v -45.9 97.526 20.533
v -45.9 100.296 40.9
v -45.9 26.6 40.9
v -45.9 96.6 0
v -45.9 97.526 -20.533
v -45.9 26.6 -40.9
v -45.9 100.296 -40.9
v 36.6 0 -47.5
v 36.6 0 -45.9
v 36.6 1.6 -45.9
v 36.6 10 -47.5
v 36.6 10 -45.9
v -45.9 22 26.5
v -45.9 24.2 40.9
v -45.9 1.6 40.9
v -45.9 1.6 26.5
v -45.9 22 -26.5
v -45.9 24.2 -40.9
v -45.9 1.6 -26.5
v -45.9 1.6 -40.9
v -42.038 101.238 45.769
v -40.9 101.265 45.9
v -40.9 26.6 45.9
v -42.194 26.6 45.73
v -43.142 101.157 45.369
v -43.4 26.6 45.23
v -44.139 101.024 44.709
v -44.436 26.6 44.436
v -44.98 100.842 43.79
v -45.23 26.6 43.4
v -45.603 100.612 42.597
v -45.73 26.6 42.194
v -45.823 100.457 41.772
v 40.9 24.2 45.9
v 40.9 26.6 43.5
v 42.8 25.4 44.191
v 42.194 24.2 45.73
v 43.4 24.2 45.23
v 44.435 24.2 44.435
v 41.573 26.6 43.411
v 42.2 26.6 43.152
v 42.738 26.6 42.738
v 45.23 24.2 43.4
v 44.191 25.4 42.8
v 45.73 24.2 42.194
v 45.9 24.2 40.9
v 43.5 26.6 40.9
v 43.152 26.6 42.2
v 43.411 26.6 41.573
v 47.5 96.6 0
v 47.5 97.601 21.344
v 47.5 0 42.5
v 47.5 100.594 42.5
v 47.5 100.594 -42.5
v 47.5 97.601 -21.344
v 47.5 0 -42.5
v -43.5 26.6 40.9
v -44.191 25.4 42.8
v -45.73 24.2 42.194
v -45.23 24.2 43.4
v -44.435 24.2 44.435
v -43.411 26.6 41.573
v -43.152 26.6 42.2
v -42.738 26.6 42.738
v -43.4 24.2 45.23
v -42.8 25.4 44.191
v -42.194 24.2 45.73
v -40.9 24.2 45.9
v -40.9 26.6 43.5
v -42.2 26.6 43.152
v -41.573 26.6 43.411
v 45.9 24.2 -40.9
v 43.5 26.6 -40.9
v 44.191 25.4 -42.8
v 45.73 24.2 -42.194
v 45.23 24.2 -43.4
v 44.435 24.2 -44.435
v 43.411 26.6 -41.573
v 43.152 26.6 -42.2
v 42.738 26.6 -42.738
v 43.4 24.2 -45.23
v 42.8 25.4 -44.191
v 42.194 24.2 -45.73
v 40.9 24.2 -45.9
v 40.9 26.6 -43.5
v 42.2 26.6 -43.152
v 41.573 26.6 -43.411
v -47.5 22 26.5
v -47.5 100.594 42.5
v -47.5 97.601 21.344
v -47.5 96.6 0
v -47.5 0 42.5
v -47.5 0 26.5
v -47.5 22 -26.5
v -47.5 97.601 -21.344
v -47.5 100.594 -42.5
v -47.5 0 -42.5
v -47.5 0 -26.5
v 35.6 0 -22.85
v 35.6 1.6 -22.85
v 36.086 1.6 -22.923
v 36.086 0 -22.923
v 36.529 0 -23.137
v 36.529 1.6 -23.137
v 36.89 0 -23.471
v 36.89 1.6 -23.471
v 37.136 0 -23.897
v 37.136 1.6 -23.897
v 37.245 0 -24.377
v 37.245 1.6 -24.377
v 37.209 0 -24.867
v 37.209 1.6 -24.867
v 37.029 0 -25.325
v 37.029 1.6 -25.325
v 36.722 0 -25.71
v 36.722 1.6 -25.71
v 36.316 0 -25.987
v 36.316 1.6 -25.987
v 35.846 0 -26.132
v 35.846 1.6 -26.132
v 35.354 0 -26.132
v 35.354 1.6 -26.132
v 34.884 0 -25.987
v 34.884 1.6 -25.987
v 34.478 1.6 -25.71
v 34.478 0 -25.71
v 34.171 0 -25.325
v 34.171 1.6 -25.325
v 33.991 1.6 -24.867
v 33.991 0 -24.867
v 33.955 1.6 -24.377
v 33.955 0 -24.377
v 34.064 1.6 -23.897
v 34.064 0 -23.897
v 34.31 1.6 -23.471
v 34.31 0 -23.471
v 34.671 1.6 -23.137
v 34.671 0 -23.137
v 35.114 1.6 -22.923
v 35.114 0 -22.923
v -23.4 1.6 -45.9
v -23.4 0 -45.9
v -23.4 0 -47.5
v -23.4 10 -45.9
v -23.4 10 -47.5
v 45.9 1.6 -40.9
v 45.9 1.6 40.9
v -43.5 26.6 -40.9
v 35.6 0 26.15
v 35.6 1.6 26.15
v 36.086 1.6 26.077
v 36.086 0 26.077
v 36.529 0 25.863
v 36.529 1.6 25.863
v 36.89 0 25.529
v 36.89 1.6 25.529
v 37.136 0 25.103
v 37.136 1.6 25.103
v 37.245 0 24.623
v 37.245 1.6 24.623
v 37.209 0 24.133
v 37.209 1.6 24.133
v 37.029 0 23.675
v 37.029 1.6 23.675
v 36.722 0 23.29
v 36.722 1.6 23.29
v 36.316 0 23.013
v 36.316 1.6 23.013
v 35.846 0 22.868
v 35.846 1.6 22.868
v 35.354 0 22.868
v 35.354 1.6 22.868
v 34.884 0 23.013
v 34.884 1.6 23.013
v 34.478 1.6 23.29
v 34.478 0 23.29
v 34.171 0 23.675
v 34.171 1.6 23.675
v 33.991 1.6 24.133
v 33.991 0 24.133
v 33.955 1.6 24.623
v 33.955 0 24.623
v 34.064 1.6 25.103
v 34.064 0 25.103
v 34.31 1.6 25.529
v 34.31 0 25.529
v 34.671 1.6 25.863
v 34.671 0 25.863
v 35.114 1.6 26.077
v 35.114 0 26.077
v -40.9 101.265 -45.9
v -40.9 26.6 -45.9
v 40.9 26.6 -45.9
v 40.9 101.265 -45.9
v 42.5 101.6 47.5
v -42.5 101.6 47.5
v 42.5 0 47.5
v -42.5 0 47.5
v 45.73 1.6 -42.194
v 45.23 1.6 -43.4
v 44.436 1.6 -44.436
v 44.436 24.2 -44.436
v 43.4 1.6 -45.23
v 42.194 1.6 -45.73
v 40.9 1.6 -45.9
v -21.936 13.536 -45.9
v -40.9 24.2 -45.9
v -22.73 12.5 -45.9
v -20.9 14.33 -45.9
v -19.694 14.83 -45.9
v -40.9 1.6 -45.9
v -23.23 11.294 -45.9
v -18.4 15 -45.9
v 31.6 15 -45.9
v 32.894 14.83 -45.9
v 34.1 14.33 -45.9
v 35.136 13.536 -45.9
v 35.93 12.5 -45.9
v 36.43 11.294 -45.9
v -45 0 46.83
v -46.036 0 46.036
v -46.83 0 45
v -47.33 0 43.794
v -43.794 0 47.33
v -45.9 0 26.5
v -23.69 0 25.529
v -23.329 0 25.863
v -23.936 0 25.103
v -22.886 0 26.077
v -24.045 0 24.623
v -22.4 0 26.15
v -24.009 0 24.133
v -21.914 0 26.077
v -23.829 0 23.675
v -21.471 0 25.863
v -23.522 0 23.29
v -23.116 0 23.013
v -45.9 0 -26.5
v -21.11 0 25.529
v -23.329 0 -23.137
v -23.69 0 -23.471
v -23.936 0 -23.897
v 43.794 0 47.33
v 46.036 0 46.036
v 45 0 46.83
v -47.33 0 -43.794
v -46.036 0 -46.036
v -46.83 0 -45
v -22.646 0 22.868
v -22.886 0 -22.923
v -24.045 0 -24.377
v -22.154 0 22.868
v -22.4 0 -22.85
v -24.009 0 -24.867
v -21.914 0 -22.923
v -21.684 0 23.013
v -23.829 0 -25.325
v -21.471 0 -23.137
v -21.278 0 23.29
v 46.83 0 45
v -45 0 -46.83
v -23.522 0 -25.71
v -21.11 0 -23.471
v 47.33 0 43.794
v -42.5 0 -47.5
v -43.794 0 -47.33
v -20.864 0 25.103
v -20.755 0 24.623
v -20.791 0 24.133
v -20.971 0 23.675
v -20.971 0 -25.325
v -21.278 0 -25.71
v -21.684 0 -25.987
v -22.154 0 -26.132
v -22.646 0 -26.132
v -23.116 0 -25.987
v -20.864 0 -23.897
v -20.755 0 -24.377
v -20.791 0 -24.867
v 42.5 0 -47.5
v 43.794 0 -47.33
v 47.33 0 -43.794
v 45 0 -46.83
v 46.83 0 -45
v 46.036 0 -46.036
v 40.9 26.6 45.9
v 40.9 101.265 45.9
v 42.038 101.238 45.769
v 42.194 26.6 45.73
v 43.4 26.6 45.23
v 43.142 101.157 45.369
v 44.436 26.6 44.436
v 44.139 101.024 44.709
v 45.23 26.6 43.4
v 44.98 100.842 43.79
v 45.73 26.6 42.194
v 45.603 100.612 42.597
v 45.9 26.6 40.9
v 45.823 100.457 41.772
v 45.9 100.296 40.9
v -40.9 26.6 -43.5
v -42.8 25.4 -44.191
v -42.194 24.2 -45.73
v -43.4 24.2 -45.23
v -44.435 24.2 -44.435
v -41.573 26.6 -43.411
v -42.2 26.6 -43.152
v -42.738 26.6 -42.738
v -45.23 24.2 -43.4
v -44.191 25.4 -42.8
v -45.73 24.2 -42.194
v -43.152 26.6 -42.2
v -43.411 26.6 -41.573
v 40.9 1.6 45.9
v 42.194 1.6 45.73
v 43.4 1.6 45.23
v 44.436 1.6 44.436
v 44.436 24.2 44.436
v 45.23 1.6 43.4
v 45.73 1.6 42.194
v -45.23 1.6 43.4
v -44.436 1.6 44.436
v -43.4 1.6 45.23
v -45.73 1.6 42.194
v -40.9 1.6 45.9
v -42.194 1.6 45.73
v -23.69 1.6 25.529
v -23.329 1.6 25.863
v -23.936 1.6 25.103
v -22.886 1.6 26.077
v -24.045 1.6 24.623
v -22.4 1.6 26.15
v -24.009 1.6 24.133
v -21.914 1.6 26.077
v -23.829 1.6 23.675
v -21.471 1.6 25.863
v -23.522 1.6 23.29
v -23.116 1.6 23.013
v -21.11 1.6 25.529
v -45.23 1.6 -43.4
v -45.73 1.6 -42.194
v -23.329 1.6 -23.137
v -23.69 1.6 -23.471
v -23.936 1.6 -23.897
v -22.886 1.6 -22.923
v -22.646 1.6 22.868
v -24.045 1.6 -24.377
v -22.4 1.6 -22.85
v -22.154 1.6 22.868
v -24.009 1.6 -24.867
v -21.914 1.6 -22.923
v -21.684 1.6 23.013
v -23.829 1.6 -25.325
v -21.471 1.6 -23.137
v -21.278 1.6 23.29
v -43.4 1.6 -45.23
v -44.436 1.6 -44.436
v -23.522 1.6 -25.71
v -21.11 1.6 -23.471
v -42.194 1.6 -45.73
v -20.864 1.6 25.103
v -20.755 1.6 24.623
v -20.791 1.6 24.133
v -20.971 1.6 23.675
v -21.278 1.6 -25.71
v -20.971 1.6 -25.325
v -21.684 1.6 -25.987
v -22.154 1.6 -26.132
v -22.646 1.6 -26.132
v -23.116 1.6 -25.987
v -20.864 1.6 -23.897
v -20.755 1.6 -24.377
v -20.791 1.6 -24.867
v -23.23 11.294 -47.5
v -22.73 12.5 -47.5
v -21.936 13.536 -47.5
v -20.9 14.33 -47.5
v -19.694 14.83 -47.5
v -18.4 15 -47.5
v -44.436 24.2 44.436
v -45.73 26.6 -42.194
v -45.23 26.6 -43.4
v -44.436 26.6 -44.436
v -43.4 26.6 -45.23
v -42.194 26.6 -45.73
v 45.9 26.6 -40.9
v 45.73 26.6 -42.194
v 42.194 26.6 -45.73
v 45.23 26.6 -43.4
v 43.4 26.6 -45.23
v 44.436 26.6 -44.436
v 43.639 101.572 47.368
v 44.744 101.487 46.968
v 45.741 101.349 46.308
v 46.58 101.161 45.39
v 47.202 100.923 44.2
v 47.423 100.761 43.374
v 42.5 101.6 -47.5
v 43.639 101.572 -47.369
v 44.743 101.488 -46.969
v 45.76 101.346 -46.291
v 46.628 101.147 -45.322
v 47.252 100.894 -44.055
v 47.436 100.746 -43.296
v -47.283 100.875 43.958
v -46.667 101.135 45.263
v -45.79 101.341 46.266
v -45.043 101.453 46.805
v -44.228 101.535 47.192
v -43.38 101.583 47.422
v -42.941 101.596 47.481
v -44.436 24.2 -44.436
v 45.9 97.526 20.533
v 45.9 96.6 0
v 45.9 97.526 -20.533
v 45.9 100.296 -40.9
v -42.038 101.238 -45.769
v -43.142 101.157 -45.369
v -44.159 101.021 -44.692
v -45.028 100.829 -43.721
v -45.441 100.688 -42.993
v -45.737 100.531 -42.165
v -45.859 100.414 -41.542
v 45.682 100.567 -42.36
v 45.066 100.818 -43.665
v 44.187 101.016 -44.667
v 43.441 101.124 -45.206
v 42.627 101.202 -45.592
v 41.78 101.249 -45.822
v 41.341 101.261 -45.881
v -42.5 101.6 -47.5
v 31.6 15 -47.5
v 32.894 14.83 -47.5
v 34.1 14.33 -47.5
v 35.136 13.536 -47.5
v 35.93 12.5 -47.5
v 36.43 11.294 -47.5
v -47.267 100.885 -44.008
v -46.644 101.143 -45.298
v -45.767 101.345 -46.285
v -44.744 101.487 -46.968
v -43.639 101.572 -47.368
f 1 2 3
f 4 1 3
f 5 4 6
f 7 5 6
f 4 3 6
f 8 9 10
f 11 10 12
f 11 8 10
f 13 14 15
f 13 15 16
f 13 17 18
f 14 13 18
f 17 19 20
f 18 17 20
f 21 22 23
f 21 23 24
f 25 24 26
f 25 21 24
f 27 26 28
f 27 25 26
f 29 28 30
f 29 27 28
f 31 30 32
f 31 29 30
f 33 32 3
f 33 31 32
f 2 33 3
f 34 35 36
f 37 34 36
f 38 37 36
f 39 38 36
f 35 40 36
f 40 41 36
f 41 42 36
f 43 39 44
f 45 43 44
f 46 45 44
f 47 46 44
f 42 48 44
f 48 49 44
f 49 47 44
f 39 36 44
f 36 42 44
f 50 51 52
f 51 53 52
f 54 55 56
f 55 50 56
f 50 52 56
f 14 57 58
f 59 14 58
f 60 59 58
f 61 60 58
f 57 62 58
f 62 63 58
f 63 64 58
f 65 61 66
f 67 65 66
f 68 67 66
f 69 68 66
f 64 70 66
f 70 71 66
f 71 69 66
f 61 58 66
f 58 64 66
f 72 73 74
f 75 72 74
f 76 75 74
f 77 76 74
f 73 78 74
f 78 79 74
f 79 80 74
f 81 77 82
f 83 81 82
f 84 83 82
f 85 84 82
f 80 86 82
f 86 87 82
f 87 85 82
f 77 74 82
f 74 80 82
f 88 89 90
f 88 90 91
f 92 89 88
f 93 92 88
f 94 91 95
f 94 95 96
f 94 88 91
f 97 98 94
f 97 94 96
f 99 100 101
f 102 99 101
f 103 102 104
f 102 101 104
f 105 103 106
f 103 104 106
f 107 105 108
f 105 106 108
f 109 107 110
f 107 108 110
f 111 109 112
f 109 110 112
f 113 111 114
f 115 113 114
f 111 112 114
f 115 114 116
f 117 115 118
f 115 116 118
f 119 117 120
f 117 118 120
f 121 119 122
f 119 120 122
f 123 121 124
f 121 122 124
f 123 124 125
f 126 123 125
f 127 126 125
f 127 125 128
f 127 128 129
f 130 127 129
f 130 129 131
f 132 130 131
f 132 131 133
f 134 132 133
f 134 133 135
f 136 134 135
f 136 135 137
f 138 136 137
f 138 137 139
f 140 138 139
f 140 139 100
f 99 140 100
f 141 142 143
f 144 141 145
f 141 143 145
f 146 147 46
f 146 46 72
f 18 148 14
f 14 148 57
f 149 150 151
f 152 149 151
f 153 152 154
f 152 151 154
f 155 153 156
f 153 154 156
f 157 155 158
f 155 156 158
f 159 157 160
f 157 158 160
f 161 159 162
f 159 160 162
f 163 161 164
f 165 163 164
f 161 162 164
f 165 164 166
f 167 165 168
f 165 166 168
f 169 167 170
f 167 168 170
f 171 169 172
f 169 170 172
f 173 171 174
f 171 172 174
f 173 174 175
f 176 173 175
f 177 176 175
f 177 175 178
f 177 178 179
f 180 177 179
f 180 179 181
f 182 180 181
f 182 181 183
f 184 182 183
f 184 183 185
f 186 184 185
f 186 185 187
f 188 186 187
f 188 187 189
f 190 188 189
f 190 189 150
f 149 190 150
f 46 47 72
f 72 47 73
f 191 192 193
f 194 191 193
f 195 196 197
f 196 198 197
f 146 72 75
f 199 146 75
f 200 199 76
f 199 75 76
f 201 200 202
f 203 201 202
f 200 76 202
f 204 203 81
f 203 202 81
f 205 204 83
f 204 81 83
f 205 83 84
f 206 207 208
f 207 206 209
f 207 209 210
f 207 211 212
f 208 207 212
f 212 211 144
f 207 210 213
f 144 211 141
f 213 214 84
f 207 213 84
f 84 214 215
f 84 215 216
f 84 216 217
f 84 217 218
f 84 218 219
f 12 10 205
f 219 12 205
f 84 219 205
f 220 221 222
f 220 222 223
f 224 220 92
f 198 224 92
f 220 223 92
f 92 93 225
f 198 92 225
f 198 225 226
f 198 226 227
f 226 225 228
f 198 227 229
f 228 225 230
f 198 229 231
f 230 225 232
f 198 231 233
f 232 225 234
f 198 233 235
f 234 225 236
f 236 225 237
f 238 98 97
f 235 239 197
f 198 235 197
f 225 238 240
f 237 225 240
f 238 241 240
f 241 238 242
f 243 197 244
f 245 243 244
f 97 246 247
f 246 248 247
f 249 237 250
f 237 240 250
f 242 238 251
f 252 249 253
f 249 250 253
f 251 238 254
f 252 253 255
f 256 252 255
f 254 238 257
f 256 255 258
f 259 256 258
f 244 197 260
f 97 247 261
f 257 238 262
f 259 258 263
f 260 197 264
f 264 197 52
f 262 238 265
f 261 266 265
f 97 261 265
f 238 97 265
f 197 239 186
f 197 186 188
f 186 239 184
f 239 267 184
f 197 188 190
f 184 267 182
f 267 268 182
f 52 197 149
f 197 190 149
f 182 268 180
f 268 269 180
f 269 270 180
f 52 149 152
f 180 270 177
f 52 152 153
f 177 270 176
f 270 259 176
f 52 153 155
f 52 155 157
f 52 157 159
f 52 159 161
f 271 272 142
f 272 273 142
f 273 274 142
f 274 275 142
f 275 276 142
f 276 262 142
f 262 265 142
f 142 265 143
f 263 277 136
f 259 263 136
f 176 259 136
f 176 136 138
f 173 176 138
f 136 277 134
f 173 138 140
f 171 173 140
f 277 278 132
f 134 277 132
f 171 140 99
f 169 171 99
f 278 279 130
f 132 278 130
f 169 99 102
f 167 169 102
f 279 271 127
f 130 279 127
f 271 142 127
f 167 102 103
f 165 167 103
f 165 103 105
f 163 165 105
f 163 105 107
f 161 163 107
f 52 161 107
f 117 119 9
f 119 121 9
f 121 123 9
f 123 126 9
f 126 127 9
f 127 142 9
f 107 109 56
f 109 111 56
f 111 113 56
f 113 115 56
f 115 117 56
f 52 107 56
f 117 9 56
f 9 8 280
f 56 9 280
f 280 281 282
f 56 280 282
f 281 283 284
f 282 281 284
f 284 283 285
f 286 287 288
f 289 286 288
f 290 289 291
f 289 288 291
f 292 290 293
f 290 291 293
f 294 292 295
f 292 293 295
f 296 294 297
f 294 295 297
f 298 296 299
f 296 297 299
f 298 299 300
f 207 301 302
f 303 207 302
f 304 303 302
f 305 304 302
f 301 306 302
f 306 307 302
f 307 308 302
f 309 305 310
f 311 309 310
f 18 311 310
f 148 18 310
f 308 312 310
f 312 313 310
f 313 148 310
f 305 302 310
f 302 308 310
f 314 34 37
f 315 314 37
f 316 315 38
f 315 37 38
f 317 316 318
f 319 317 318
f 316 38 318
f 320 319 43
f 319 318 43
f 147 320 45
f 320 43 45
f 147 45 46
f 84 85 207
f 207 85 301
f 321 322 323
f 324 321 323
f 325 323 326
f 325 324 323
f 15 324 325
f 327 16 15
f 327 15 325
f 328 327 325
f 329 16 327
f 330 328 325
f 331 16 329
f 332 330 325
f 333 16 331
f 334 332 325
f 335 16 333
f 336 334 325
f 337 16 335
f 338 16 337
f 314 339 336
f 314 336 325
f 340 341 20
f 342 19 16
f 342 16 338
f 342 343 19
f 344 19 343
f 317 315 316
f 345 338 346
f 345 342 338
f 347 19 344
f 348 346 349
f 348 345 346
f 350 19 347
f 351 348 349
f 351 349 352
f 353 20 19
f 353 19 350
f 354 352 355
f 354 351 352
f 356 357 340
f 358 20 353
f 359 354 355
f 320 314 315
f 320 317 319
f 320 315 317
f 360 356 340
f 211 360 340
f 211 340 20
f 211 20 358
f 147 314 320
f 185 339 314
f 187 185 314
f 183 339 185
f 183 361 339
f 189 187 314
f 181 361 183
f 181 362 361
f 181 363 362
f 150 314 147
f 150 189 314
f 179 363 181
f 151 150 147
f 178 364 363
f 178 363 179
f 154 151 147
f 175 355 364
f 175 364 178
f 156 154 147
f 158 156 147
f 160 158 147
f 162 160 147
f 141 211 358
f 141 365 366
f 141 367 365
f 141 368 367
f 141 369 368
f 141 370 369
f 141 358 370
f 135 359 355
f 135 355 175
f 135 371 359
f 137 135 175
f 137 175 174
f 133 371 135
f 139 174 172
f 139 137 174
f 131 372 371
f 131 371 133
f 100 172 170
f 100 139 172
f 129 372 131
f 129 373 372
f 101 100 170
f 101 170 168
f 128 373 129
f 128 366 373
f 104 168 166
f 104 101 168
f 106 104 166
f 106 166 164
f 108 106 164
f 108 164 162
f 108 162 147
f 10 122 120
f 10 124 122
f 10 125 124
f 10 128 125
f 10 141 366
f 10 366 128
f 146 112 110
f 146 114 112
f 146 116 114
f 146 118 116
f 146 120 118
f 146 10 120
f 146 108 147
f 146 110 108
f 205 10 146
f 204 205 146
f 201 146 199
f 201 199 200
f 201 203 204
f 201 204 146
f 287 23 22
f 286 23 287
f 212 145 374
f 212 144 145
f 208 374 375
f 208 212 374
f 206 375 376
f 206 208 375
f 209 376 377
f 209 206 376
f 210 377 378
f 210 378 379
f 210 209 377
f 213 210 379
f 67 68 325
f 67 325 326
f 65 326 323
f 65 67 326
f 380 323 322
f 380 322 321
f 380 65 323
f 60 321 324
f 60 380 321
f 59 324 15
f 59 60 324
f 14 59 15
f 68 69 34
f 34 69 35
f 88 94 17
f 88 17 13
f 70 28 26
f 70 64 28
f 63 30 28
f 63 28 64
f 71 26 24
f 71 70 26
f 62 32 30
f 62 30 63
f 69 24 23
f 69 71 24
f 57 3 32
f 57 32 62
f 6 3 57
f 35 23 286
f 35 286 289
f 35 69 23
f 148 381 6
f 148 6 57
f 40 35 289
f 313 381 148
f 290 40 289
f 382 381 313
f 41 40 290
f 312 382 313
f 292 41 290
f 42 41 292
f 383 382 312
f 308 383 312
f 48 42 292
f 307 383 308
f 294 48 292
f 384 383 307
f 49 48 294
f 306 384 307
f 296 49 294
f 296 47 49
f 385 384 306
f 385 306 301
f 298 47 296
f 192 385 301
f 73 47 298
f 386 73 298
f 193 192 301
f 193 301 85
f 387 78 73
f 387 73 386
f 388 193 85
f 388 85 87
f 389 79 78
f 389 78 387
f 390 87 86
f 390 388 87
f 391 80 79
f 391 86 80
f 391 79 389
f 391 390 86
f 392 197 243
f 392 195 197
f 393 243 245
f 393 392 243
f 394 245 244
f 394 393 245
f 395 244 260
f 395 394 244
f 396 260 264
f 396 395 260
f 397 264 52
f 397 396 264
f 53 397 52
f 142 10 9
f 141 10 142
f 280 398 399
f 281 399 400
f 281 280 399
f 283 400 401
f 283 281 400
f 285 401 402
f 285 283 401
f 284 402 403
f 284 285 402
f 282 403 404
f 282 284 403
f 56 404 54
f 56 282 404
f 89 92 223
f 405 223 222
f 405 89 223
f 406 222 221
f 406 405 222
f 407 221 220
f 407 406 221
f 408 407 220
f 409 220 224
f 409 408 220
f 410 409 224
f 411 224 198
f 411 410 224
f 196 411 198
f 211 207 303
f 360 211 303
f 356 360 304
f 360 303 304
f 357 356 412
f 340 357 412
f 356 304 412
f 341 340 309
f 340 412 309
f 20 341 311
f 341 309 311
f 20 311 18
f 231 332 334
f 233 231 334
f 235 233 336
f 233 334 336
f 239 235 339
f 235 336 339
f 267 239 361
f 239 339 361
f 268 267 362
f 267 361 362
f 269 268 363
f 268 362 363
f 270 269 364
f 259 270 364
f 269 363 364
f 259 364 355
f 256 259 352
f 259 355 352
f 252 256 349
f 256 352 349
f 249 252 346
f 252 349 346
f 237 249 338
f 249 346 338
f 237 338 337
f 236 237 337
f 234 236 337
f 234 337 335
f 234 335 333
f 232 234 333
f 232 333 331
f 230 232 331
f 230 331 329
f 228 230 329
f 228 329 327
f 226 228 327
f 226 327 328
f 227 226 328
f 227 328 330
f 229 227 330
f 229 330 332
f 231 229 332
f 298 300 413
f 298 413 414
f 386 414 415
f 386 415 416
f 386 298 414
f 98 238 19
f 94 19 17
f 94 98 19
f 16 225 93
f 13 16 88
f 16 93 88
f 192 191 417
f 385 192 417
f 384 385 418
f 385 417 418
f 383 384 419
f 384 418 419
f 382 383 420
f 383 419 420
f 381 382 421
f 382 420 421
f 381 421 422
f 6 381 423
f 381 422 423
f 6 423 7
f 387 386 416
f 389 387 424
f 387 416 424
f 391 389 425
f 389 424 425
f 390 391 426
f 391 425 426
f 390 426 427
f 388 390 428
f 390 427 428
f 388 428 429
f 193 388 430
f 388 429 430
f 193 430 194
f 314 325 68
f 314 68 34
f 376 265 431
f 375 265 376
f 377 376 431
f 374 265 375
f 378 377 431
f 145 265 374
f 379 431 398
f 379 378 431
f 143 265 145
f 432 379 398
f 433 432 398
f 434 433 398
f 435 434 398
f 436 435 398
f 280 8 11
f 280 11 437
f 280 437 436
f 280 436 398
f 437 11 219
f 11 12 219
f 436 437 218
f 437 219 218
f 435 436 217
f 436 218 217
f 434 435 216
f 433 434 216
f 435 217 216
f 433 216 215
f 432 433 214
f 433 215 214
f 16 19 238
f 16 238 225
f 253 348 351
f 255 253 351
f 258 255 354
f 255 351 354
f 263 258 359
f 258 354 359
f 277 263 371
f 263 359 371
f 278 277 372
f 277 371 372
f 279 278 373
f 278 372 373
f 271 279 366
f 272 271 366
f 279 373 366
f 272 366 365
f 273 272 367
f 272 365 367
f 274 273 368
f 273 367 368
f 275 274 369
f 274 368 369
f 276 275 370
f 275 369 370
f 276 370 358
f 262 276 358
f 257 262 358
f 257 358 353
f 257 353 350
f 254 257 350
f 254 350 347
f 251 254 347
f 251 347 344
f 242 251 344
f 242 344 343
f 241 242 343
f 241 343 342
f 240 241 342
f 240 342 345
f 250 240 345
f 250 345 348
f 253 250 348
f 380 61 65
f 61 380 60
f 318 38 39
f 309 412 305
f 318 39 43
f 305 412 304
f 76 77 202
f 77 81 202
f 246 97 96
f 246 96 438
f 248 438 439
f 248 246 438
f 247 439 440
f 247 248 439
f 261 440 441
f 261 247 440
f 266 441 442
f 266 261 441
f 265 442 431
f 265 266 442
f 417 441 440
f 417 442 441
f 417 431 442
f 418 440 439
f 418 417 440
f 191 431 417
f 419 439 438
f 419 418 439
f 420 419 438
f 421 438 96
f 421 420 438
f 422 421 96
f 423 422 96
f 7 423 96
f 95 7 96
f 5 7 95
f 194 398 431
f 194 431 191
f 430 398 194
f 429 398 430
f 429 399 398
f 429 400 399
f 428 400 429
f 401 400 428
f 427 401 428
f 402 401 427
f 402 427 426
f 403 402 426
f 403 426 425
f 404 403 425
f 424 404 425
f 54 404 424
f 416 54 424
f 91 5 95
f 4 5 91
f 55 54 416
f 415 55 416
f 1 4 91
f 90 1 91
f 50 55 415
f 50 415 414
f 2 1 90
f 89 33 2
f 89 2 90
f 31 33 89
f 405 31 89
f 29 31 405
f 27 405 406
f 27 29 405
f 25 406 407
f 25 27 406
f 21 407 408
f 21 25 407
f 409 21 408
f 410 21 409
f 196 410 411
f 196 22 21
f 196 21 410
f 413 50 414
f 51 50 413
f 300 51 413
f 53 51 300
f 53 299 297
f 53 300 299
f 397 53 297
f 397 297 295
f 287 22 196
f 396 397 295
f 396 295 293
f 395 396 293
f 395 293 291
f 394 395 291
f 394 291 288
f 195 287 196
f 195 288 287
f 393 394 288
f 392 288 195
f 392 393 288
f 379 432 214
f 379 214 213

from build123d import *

# Parameters (mm, degrees)
SKETCH1_W           = 95
SKETCH1_H           = 95
BOSS_EXTRUDE1_DEPTH = 1.6
SKETCH2_W           = 95
SKETCH2_H           = 95
SKETCH2_W_2         = 91.8
SKETCH2_H_2         = 91.8
BOSS_EXTRUDE2_DEPTH = 100
CUT_EXTRUDE1_DEPTH  = 147.982345879
FILLET1_R           = 5
SKETCH4_W           = 53
SKETCH4_H           = 22
CUT_EXTRUDE2_DEPTH  = 1.6
SKETCH5_R           = 1.65
CUT_EXTRUDE3_DEPTH  = 121.467838193
SKETCH6_W           = 60
SKETCH6_H           = 15
CUT_EXTRUDE4_DEPTH  = 1.6
FILLET2_R           = 5
BOSS_EXTRUDE3_START = 25
BOSS_EXTRUDE3_DEPTH = 2.4
CHAMFER1_SIZE       = 2.4


with BuildPart() as part:
    # Sketch1 → Boss-Extrude1 (new body)
    with BuildSketch(Plane(origin=(0, 0, 0), x_dir=(1, 0, 0), z_dir=(0, 1, 0))):
        Rectangle(SKETCH1_W, SKETCH1_H)
    extrude(amount=BOSS_EXTRUDE1_DEPTH)

    # Sketch2 → Boss-Extrude2 (add)
    with BuildSketch(Plane(origin=(0, 1.6, 0), x_dir=(1, 0, 0), z_dir=(0, 1, 0))):
        Rectangle(SKETCH2_W, SKETCH2_H)
        Rectangle(SKETCH2_W_2, SKETCH2_H_2, mode=Mode.SUBTRACT)
    extrude(amount=BOSS_EXTRUDE2_DEPTH)

    # Sketch3 → Cut-Extrude1 (cut, through all)
    with BuildSketch(Plane(origin=(47.5, 0, 0), x_dir=(0, 0, -1), z_dir=(1, 0, 0))):
        with BuildLine():
            Line((-47.5, 101.6), (47.5, 101.6))
            ThreePointArc((47.5, 101.6), (0, 96.6), (-47.5, 101.6))
        make_face()
    extrude(amount=-CUT_EXTRUDE1_DEPTH, mode=Mode.SUBTRACT)

    # Fillet1
    fillet1_edges = [part.edges().sort_by_distance(p)[0] for p in [
        (-45.9, 51.432685688, -45.9),
        (-45.9, 51.432685688, 45.9),
        (45.9, 51.432685688, -45.9),
        (45.9, 51.432685688, 45.9),
        (47.5, 50.8, 47.5),
        (-47.5, 50.8, 47.5),
        (-47.5, 50.8, -47.5),
        (47.5, 50.8, -47.5),
    ]]
    fillet(fillet1_edges, radius=FILLET1_R)

    # Sketch4 → Cut-Extrude2 (cut)
    with BuildSketch(Plane.ZY.offset(47.5)):
        with Locations((0, 11)):
            Rectangle(SKETCH4_W, SKETCH4_H)
    extrude(amount=-CUT_EXTRUDE2_DEPTH, mode=Mode.SUBTRACT)

    # Sketch5 → Cut-Extrude3 (cut, through all)
    with BuildSketch(Plane(origin=(0, 1.6, 0), x_dir=(1, 0, 0), z_dir=(0, 1, 0))):
        with Locations(Location((-22.4, 24.5, 0), (0, 0, 270))):
            Circle(SKETCH5_R)
        with Locations(Location((35.6, 24.5, 0), (0, 0, 270))):
            Circle(SKETCH5_R)
        with Locations(Location((35.6, -24.5, 0), (0, 0, 270))):
            Circle(SKETCH5_R)
        with Locations(Location((-22.4, -24.5, 0), (0, 0, 270))):
            Circle(SKETCH5_R)
    extrude(amount=-CUT_EXTRUDE3_DEPTH, mode=Mode.SUBTRACT)

    # Sketch6 → Cut-Extrude4 (cut)
    with BuildSketch(Plane(origin=(0, 0, -47.5), x_dir=(-1, 0, 0), z_dir=(0, 0, -1))):
        with Locations((-6.6, 7.5)):
            Rectangle(SKETCH6_W, SKETCH6_H)
    extrude(amount=-CUT_EXTRUDE4_DEPTH, mode=Mode.SUBTRACT)

    # Fillet2
    fillet2_edges = [part.edges().sort_by_distance(p)[0] for p in [
        (-23.4, 15, -46.7),
        (36.6, 15, -46.7),
    ]]
    fillet(fillet2_edges, radius=FILLET2_R)

    # Sketch7 → Boss-Extrude3 (add)
    with BuildSketch(Plane(origin=(0, 1.6, 0), x_dir=(1, 0, 0), z_dir=(0, 1, 0)).offset(BOSS_EXTRUDE3_START)):
        with BuildLine():
            Line((-40.9, -45.9), (40.9, -45.9))
            ThreePointArc((40.9, -45.9), (44.435533906, -44.435533906), (45.9, -40.9))
            Line((45.9, -40.9), (45.9, 40.9))
            ThreePointArc((45.9, 40.9), (44.435533906, 44.435533906), (40.9, 45.9))
            Line((40.9, 45.9), (36.6, 45.9))
            Line((36.6, 45.9), (-23.4, 45.9))
            Line((-23.4, 45.9), (-40.9, 45.9))
            ThreePointArc((-40.9, 45.9), (-44.435533906, 44.435533906), (-45.9, 40.9))
            Line((-45.9, 40.9), (-45.9, 26.5))
            Line((-45.9, 26.5), (-45.9, -26.5))
            Line((-45.9, -26.5), (-45.9, -40.9))
            ThreePointArc((-45.9, -40.9), (-44.435533906, -44.435533906), (-40.9, -45.9))
        make_face()
        with BuildLine():
            Line((-40.9, -43.5), (40.9, -43.5))
            ThreePointArc((40.9, -43.5), (42.738477631, -42.738477631), (43.5, -40.9))
            Line((43.5, -40.9), (43.5, 40.9))
            ThreePointArc((43.5, 40.9), (42.738477631, 42.738477631), (40.9, 43.5))
            Line((40.9, 43.5), (36.6, 43.5))
            Line((36.6, 43.5), (-23.4, 43.5))
            Line((-23.4, 43.5), (-40.9, 43.5))
            ThreePointArc((-40.9, 43.5), (-42.738477631, 42.738477631), (-43.5, 40.9))
            Line((-43.5, 40.9), (-43.5, 26.5))
            Line((-43.5, 26.5), (-43.5, -26.5))
            Line((-43.5, -26.5), (-43.5, -40.9))
            ThreePointArc((-43.5, -40.9), (-42.738477631, -42.738477631), (-40.9, -43.5))
        make_face(mode=Mode.SUBTRACT)
    extrude(amount=-BOSS_EXTRUDE3_DEPTH)

    # Chamfer1
    chamfer1_edges = [part.edges().sort_by_distance(p)[0] for p in [
        (0, 24.2, 43.5),
        (42.738477631, 24.2, 42.738477631),
        (-42.738477631, 24.2, 42.738477631),
        (43.5, 24.2, 0),
        (-43.5, 24.2, 0),
        (42.738477631, 24.2, -42.738477631),
        (-42.738477631, 24.2, -42.738477631),
        (0, 24.2, -43.5),
    ]]
    chamfer(chamfer1_edges, length=CHAMFER1_SIZE - 0.0001)  # a hair under: the kernel refuses the full size


solid = part.part
